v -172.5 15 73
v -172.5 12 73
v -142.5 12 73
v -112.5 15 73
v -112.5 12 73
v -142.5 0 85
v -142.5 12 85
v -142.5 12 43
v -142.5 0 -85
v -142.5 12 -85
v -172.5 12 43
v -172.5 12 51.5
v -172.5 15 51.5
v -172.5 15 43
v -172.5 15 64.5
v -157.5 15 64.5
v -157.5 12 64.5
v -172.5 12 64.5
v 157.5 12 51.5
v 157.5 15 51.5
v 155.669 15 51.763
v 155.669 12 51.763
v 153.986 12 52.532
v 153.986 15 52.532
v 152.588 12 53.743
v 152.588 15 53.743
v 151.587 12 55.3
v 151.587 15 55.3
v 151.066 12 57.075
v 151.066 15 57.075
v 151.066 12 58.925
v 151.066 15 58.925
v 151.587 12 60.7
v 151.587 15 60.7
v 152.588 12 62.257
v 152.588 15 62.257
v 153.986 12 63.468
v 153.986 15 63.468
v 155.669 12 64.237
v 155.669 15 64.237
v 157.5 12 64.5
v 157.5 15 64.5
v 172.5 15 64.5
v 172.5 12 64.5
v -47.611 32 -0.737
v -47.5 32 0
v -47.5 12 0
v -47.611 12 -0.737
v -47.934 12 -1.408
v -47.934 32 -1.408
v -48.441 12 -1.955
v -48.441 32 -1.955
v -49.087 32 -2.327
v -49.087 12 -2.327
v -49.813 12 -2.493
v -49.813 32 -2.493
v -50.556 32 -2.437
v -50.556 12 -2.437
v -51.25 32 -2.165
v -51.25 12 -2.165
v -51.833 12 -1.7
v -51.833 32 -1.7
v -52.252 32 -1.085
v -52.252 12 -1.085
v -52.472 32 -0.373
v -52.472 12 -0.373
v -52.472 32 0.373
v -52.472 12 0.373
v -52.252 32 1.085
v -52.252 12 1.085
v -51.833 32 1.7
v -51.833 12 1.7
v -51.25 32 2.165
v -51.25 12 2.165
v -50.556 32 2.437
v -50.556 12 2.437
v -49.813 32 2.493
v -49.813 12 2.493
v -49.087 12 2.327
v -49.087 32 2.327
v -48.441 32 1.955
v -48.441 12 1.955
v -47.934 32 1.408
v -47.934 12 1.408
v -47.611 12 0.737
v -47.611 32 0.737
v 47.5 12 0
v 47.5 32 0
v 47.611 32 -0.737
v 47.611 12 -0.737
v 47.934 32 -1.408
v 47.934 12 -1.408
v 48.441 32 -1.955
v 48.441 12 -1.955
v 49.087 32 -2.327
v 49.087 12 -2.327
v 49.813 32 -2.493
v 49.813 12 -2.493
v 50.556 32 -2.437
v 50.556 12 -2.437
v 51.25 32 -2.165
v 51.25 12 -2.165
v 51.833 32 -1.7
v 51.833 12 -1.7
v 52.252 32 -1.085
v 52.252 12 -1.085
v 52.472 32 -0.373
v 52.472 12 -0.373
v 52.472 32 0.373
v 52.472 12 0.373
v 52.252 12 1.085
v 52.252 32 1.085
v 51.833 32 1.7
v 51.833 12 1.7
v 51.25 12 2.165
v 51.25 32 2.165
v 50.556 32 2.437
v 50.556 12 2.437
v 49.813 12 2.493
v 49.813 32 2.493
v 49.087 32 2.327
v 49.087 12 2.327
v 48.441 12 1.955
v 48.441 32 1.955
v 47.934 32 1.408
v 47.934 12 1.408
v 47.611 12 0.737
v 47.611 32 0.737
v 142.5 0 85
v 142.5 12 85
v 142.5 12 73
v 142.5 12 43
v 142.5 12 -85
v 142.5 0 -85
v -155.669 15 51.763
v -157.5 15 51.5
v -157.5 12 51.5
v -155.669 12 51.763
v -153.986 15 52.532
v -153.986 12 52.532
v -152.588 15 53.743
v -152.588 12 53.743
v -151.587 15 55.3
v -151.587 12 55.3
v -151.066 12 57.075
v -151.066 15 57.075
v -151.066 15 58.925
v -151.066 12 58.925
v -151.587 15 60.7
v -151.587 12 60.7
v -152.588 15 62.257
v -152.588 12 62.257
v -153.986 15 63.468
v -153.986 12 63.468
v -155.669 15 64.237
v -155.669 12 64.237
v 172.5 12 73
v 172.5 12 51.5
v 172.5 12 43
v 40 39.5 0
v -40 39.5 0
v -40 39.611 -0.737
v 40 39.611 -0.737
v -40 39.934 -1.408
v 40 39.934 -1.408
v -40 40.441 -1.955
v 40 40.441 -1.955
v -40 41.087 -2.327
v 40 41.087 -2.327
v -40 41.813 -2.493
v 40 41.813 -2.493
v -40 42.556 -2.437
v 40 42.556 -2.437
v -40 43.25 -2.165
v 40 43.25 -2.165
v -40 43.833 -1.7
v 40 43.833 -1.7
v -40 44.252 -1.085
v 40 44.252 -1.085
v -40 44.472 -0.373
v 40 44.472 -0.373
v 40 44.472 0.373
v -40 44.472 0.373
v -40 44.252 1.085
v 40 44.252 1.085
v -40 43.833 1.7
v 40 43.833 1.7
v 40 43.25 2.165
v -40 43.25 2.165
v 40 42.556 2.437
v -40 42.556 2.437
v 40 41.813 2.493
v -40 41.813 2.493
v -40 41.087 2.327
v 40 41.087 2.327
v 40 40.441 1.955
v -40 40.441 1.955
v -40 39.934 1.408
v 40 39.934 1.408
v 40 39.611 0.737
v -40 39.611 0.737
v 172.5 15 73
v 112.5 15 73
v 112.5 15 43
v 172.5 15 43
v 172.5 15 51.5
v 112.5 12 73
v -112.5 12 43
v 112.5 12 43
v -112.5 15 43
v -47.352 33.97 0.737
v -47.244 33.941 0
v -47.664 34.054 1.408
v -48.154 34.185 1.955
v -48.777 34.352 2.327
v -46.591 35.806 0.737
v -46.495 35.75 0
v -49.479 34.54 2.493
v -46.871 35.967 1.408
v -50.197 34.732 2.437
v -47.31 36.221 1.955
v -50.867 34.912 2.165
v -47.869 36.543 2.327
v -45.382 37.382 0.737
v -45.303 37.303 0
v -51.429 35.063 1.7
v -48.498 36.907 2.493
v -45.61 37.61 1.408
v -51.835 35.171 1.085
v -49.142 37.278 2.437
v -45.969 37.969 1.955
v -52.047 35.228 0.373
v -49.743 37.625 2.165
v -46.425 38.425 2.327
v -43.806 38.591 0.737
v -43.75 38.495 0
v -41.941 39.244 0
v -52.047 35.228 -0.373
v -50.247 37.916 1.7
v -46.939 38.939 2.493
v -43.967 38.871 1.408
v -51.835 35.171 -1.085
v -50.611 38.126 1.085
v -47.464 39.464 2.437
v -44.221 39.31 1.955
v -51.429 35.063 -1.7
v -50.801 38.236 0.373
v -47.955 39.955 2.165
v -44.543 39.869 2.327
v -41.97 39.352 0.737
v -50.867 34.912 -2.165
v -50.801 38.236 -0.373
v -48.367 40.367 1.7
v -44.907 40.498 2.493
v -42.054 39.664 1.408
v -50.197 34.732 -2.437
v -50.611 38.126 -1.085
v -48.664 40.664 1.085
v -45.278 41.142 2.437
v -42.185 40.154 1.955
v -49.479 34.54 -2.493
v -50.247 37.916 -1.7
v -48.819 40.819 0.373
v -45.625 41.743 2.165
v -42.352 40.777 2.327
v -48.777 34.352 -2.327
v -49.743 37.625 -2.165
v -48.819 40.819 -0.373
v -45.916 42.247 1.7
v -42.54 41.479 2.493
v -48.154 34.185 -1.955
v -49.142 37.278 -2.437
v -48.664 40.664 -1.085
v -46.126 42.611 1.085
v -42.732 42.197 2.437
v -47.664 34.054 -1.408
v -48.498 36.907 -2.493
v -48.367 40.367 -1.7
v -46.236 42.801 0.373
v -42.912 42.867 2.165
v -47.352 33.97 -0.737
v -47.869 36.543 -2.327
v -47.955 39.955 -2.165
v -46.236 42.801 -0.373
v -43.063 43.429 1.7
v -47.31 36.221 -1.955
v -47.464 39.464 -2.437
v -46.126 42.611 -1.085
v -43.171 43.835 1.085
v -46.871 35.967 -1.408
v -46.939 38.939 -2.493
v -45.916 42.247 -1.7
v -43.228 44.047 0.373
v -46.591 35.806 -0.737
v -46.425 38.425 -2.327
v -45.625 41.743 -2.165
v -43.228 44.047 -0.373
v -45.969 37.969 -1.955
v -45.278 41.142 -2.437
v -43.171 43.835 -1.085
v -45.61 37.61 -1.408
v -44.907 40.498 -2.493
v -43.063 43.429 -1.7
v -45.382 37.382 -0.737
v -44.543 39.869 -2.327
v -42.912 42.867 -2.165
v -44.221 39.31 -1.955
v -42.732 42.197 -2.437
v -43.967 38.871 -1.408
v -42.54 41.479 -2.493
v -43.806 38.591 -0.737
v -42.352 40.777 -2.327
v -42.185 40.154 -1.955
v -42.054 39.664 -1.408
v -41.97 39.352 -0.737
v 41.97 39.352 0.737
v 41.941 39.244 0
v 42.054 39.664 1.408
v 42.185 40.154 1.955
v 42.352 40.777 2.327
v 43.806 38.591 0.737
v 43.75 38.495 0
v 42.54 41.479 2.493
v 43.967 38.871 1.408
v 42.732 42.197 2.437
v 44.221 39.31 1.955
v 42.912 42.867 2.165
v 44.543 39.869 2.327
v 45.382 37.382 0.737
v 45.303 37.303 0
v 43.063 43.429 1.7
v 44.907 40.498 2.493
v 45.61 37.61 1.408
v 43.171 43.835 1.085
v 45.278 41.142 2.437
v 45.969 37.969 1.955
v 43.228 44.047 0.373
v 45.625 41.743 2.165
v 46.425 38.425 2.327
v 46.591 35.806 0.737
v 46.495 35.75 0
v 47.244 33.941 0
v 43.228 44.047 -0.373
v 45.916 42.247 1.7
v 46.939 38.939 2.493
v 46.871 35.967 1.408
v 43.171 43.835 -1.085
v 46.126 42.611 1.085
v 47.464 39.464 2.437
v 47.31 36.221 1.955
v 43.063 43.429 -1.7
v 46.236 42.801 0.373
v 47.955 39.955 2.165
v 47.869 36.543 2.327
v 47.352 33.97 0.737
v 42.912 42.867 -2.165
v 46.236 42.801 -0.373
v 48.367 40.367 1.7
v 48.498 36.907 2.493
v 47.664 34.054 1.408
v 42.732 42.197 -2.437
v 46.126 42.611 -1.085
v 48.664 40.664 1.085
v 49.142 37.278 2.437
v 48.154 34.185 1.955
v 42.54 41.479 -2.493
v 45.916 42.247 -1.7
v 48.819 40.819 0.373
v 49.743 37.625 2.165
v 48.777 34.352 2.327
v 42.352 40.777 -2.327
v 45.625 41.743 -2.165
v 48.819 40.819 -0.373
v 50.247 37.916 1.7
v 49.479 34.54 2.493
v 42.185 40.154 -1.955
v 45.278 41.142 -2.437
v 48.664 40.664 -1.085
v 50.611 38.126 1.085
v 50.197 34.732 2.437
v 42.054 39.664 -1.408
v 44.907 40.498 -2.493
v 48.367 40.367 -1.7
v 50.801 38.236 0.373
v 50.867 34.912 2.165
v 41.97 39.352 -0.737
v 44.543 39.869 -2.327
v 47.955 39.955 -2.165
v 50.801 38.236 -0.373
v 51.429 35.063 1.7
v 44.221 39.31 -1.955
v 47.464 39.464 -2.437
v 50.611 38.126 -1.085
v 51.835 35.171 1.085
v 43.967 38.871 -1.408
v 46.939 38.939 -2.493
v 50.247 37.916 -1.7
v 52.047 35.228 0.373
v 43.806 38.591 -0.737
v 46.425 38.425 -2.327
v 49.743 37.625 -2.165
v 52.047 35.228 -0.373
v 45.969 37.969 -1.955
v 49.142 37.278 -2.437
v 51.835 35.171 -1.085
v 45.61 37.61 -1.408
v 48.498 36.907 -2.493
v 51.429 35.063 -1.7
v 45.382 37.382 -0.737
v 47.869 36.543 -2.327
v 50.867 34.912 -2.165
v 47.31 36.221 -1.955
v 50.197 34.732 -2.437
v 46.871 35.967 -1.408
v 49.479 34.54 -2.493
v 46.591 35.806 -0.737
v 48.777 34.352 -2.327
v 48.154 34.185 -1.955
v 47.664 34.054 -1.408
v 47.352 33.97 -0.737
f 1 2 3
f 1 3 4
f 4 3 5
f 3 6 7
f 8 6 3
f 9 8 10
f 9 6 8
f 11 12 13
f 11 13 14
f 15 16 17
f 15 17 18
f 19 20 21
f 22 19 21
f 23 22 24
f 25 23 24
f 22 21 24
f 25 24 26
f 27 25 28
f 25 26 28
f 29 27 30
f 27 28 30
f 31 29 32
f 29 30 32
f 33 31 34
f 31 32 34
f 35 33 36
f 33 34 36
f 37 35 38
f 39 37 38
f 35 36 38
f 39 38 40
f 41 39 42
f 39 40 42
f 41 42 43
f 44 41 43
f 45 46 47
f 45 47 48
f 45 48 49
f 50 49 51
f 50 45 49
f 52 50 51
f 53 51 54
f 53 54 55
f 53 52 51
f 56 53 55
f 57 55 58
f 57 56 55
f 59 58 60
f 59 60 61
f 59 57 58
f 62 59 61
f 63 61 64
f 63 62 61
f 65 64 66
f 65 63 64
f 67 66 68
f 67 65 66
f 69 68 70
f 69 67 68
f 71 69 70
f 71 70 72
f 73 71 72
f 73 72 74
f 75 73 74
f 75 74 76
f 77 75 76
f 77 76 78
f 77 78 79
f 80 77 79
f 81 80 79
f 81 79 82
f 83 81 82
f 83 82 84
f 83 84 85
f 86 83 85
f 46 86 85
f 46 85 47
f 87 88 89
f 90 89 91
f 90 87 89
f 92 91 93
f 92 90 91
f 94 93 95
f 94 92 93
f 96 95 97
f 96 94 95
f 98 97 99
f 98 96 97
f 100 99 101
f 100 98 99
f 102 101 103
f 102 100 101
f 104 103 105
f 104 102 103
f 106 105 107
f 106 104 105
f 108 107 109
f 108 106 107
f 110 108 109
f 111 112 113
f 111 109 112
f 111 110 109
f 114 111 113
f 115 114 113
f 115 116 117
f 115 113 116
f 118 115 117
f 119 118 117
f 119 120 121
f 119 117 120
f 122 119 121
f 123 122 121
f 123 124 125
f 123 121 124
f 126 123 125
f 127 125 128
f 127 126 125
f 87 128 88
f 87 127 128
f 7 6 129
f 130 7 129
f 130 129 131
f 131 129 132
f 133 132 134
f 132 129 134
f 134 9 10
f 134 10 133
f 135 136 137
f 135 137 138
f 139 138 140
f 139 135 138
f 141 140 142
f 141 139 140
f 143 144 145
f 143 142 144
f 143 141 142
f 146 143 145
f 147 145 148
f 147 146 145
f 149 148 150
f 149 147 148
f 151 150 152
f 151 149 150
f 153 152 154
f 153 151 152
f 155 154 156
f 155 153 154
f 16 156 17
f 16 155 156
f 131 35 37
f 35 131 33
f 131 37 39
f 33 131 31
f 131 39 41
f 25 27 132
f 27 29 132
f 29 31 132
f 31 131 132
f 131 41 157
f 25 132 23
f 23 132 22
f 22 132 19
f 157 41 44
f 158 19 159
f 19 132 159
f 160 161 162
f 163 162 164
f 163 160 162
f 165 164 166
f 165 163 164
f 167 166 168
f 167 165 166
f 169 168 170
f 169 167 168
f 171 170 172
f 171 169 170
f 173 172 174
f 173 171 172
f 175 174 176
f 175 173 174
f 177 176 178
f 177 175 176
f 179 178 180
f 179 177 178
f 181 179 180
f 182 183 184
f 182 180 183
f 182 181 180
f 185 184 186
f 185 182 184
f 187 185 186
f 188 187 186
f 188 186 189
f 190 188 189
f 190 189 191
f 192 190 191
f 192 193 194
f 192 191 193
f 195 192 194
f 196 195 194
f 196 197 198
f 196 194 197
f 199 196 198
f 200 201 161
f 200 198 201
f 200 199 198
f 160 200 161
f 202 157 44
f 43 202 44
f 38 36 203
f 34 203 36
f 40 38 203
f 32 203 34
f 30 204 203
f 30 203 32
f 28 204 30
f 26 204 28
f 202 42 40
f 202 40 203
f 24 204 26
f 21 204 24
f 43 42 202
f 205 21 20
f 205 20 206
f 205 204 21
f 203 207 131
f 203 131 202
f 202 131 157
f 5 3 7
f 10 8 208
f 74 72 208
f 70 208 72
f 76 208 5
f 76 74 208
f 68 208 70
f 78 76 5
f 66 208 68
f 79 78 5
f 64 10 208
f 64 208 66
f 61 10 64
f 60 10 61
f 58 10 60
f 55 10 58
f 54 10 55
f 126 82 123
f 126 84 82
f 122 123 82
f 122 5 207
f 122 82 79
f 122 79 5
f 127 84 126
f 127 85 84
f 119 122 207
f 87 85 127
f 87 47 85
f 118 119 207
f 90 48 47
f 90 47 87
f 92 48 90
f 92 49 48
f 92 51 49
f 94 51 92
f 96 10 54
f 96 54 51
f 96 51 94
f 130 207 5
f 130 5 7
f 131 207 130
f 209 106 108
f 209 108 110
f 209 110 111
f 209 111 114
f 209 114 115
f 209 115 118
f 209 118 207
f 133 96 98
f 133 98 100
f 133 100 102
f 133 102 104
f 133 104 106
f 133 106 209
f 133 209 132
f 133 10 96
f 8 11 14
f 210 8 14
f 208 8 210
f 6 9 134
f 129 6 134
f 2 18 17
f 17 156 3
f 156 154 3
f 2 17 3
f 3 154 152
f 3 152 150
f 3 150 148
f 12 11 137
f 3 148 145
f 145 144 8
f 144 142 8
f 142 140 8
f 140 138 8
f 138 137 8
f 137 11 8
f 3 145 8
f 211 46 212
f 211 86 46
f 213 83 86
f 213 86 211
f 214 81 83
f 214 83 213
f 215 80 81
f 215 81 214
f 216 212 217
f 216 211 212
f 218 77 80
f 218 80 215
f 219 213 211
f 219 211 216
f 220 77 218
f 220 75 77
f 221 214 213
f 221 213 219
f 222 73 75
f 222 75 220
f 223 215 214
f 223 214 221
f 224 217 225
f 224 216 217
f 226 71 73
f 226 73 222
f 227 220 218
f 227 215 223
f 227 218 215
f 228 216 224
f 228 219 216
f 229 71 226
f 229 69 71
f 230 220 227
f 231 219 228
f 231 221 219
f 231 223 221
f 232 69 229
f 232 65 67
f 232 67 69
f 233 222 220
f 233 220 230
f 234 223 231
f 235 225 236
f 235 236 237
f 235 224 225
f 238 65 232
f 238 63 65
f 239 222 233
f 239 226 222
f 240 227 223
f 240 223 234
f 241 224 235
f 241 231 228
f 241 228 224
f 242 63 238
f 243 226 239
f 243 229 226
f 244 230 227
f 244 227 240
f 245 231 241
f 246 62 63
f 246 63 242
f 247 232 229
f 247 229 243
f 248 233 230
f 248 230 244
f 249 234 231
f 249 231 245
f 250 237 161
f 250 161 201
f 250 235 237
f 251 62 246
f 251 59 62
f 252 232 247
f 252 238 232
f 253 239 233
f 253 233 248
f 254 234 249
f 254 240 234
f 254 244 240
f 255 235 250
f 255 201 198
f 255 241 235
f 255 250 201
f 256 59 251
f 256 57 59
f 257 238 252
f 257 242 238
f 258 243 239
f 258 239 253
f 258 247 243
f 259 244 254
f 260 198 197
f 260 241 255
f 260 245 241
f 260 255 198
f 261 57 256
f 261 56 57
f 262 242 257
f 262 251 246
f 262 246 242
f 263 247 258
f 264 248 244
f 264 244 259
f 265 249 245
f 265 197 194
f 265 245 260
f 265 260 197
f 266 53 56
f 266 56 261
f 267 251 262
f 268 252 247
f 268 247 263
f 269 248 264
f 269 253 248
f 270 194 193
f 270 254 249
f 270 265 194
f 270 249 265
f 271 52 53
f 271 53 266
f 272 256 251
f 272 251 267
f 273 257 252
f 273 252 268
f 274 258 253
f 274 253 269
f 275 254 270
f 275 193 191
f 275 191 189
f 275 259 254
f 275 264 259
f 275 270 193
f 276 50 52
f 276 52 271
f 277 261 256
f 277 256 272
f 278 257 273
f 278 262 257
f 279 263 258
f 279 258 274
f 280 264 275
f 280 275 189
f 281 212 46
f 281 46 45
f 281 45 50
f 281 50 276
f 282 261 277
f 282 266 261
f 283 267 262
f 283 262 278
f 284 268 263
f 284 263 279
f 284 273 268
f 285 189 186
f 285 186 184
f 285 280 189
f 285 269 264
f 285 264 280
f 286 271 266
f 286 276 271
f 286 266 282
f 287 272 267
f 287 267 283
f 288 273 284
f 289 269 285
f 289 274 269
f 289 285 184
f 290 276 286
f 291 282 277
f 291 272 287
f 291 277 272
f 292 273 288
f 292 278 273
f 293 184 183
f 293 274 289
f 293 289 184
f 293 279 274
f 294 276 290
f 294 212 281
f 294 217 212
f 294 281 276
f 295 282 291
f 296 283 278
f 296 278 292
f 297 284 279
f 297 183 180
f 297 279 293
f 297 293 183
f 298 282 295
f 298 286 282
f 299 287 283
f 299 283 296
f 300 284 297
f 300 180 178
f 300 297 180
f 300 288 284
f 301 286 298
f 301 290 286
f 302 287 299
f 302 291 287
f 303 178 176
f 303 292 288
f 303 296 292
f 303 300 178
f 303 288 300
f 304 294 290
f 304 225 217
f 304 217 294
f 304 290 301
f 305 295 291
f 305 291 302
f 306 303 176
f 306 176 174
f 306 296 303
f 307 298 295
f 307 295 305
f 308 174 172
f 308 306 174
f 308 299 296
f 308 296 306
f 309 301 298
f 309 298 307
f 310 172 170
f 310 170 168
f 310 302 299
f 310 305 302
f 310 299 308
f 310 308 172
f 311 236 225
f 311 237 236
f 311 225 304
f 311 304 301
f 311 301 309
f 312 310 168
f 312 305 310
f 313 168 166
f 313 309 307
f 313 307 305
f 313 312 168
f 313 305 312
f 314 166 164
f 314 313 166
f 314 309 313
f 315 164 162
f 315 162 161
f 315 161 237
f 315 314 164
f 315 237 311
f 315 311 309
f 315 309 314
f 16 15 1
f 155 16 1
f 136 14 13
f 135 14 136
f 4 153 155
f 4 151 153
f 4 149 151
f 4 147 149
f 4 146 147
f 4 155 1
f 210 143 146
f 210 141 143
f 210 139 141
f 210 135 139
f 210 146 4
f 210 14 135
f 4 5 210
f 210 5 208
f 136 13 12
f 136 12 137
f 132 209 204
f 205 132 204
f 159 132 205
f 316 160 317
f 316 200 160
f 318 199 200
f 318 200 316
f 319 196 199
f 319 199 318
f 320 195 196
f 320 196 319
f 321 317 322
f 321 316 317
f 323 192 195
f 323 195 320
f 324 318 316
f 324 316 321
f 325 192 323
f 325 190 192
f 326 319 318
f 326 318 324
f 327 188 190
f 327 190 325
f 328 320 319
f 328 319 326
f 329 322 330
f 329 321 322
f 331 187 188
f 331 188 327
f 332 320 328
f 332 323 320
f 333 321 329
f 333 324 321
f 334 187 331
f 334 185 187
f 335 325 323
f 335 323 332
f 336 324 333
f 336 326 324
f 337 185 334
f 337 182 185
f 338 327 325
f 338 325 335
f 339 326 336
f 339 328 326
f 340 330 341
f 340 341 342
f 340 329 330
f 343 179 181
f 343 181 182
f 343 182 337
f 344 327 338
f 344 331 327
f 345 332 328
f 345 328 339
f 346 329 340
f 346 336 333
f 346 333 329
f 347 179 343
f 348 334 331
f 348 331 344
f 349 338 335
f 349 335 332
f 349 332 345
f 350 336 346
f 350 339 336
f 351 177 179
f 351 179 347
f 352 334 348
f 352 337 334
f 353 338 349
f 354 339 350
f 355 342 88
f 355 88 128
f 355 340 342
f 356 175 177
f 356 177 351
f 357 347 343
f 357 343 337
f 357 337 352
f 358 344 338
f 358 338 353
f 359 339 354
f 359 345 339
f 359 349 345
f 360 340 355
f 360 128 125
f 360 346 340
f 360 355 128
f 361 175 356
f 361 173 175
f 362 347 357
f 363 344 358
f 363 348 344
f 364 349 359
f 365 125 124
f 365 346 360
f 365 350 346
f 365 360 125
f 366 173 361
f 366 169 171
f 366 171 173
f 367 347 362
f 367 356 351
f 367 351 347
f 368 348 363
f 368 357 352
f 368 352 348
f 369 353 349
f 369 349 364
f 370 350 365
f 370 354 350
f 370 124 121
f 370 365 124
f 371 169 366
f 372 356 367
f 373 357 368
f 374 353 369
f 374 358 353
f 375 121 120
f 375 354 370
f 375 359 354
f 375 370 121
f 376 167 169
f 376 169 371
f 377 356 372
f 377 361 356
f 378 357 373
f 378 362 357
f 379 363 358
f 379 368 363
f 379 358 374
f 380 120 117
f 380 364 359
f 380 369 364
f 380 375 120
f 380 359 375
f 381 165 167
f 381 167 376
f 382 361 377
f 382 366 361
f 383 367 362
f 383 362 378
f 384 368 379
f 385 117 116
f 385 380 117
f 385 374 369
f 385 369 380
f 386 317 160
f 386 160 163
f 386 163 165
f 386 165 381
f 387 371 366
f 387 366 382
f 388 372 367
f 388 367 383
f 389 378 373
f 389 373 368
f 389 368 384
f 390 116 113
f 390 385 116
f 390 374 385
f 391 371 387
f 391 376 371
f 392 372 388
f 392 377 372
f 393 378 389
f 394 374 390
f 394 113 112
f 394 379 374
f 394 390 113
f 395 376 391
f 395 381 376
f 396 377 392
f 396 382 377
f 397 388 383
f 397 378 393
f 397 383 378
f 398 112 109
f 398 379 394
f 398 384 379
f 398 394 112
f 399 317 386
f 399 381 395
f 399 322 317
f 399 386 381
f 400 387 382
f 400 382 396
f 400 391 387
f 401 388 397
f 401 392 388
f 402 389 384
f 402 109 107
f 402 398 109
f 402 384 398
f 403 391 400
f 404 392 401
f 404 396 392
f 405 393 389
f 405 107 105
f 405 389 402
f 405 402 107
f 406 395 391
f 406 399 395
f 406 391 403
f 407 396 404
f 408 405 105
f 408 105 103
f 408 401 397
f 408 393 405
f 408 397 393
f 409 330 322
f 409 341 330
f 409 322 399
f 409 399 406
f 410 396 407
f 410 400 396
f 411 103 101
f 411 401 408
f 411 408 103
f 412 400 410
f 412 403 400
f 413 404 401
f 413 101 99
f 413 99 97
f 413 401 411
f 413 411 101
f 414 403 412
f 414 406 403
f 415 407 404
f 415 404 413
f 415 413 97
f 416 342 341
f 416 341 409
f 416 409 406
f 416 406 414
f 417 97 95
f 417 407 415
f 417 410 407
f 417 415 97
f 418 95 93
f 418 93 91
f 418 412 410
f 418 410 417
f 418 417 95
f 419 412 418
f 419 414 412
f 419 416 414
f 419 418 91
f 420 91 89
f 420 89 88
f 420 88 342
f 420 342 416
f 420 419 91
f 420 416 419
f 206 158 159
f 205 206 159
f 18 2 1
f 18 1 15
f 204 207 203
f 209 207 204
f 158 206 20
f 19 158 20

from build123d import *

# Parameters (mm, degrees)
SKETCH1_W           = 285
SKETCH1_H           = 170
BOSS_EXTRUDE1_DEPTH = 12
SKETCH2_R           = 2.5
SKETCH4_W           = 60
SKETCH4_H           = 30
BOSS_EXTRUDE2_DEPTH = 3
CUT_EXTRUDE1_DEPTH  = 195.554619595


with BuildPart() as part:
    # Sketch1 → Boss-Extrude1 (new body)
    with BuildSketch(Plane(origin=(0, 0, 0), x_dir=(1, 0, 0), z_dir=(0, 1, 0))):
        Rectangle(SKETCH1_W, SKETCH1_H)
    extrude(amount=BOSS_EXTRUDE1_DEPTH)

    # Sweep1: sweep along a path in Sketch3
    with BuildLine(Plane.XY) as sweep1_path:
        Line((-50, 12), (-50, 32))
        ThreePointArc((-50, 32), (-47.071067812, 39.071067812), (-40, 42))
        Line((-40, 42), (40, 42))
        ThreePointArc((40, 42), (47.071067812, 39.071067812), (50, 32))
        Line((50, 32), (50, 12))
    # Sketch2 → Sweep1 (sweep)
    with BuildSketch(Plane(origin=(0, 12, 0), x_dir=(1, 0, 0), z_dir=(0, 1, 0))):
        with Locations((-50, 0)):
            Circle(SKETCH2_R)
    sweep(path=sweep1_path.line)

    # Sketch4 → Boss-Extrude2 (add)
    with BuildSketch(Plane(origin=(0, 12, 0), x_dir=(1, 0, 0), z_dir=(0, 1, 0))):
        with Locations((142.5, -58)):
            Rectangle(SKETCH4_W, SKETCH4_H)
        with Locations((-142.5, -58)):
            Rectangle(SKETCH4_W, SKETCH4_H)
    extrude(amount=BOSS_EXTRUDE2_DEPTH)

    # Sketch5 → Cut-Extrude1 (cut, symmetric)
    with BuildSketch(Plane(origin=(0, 15, 0), x_dir=(1, 0, 0), z_dir=(0, 1, 0))):
        with BuildLine():
            Line((157.5, -64.5), (172.5, -64.5))
            Line((172.5, -64.5), (172.5, -51.5))
            Line((172.5, -51.5), (157.5, -51.5))
            ThreePointArc((157.5, -51.5), (151, -58), (157.5, -64.5))
        make_face()
    cut_extrude1 = extrude(amount=CUT_EXTRUDE1_DEPTH, both=True, mode=Mode.SUBTRACT)

    # Mirror1: Cut-Extrude1 across plane
    add(cut_extrude1.mirror(Plane(origin=(0, 0, 0), x_dir=(0, 0, 1), z_dir=(1, 0, 0))), mode=Mode.SUBTRACT)


solid = part.part
